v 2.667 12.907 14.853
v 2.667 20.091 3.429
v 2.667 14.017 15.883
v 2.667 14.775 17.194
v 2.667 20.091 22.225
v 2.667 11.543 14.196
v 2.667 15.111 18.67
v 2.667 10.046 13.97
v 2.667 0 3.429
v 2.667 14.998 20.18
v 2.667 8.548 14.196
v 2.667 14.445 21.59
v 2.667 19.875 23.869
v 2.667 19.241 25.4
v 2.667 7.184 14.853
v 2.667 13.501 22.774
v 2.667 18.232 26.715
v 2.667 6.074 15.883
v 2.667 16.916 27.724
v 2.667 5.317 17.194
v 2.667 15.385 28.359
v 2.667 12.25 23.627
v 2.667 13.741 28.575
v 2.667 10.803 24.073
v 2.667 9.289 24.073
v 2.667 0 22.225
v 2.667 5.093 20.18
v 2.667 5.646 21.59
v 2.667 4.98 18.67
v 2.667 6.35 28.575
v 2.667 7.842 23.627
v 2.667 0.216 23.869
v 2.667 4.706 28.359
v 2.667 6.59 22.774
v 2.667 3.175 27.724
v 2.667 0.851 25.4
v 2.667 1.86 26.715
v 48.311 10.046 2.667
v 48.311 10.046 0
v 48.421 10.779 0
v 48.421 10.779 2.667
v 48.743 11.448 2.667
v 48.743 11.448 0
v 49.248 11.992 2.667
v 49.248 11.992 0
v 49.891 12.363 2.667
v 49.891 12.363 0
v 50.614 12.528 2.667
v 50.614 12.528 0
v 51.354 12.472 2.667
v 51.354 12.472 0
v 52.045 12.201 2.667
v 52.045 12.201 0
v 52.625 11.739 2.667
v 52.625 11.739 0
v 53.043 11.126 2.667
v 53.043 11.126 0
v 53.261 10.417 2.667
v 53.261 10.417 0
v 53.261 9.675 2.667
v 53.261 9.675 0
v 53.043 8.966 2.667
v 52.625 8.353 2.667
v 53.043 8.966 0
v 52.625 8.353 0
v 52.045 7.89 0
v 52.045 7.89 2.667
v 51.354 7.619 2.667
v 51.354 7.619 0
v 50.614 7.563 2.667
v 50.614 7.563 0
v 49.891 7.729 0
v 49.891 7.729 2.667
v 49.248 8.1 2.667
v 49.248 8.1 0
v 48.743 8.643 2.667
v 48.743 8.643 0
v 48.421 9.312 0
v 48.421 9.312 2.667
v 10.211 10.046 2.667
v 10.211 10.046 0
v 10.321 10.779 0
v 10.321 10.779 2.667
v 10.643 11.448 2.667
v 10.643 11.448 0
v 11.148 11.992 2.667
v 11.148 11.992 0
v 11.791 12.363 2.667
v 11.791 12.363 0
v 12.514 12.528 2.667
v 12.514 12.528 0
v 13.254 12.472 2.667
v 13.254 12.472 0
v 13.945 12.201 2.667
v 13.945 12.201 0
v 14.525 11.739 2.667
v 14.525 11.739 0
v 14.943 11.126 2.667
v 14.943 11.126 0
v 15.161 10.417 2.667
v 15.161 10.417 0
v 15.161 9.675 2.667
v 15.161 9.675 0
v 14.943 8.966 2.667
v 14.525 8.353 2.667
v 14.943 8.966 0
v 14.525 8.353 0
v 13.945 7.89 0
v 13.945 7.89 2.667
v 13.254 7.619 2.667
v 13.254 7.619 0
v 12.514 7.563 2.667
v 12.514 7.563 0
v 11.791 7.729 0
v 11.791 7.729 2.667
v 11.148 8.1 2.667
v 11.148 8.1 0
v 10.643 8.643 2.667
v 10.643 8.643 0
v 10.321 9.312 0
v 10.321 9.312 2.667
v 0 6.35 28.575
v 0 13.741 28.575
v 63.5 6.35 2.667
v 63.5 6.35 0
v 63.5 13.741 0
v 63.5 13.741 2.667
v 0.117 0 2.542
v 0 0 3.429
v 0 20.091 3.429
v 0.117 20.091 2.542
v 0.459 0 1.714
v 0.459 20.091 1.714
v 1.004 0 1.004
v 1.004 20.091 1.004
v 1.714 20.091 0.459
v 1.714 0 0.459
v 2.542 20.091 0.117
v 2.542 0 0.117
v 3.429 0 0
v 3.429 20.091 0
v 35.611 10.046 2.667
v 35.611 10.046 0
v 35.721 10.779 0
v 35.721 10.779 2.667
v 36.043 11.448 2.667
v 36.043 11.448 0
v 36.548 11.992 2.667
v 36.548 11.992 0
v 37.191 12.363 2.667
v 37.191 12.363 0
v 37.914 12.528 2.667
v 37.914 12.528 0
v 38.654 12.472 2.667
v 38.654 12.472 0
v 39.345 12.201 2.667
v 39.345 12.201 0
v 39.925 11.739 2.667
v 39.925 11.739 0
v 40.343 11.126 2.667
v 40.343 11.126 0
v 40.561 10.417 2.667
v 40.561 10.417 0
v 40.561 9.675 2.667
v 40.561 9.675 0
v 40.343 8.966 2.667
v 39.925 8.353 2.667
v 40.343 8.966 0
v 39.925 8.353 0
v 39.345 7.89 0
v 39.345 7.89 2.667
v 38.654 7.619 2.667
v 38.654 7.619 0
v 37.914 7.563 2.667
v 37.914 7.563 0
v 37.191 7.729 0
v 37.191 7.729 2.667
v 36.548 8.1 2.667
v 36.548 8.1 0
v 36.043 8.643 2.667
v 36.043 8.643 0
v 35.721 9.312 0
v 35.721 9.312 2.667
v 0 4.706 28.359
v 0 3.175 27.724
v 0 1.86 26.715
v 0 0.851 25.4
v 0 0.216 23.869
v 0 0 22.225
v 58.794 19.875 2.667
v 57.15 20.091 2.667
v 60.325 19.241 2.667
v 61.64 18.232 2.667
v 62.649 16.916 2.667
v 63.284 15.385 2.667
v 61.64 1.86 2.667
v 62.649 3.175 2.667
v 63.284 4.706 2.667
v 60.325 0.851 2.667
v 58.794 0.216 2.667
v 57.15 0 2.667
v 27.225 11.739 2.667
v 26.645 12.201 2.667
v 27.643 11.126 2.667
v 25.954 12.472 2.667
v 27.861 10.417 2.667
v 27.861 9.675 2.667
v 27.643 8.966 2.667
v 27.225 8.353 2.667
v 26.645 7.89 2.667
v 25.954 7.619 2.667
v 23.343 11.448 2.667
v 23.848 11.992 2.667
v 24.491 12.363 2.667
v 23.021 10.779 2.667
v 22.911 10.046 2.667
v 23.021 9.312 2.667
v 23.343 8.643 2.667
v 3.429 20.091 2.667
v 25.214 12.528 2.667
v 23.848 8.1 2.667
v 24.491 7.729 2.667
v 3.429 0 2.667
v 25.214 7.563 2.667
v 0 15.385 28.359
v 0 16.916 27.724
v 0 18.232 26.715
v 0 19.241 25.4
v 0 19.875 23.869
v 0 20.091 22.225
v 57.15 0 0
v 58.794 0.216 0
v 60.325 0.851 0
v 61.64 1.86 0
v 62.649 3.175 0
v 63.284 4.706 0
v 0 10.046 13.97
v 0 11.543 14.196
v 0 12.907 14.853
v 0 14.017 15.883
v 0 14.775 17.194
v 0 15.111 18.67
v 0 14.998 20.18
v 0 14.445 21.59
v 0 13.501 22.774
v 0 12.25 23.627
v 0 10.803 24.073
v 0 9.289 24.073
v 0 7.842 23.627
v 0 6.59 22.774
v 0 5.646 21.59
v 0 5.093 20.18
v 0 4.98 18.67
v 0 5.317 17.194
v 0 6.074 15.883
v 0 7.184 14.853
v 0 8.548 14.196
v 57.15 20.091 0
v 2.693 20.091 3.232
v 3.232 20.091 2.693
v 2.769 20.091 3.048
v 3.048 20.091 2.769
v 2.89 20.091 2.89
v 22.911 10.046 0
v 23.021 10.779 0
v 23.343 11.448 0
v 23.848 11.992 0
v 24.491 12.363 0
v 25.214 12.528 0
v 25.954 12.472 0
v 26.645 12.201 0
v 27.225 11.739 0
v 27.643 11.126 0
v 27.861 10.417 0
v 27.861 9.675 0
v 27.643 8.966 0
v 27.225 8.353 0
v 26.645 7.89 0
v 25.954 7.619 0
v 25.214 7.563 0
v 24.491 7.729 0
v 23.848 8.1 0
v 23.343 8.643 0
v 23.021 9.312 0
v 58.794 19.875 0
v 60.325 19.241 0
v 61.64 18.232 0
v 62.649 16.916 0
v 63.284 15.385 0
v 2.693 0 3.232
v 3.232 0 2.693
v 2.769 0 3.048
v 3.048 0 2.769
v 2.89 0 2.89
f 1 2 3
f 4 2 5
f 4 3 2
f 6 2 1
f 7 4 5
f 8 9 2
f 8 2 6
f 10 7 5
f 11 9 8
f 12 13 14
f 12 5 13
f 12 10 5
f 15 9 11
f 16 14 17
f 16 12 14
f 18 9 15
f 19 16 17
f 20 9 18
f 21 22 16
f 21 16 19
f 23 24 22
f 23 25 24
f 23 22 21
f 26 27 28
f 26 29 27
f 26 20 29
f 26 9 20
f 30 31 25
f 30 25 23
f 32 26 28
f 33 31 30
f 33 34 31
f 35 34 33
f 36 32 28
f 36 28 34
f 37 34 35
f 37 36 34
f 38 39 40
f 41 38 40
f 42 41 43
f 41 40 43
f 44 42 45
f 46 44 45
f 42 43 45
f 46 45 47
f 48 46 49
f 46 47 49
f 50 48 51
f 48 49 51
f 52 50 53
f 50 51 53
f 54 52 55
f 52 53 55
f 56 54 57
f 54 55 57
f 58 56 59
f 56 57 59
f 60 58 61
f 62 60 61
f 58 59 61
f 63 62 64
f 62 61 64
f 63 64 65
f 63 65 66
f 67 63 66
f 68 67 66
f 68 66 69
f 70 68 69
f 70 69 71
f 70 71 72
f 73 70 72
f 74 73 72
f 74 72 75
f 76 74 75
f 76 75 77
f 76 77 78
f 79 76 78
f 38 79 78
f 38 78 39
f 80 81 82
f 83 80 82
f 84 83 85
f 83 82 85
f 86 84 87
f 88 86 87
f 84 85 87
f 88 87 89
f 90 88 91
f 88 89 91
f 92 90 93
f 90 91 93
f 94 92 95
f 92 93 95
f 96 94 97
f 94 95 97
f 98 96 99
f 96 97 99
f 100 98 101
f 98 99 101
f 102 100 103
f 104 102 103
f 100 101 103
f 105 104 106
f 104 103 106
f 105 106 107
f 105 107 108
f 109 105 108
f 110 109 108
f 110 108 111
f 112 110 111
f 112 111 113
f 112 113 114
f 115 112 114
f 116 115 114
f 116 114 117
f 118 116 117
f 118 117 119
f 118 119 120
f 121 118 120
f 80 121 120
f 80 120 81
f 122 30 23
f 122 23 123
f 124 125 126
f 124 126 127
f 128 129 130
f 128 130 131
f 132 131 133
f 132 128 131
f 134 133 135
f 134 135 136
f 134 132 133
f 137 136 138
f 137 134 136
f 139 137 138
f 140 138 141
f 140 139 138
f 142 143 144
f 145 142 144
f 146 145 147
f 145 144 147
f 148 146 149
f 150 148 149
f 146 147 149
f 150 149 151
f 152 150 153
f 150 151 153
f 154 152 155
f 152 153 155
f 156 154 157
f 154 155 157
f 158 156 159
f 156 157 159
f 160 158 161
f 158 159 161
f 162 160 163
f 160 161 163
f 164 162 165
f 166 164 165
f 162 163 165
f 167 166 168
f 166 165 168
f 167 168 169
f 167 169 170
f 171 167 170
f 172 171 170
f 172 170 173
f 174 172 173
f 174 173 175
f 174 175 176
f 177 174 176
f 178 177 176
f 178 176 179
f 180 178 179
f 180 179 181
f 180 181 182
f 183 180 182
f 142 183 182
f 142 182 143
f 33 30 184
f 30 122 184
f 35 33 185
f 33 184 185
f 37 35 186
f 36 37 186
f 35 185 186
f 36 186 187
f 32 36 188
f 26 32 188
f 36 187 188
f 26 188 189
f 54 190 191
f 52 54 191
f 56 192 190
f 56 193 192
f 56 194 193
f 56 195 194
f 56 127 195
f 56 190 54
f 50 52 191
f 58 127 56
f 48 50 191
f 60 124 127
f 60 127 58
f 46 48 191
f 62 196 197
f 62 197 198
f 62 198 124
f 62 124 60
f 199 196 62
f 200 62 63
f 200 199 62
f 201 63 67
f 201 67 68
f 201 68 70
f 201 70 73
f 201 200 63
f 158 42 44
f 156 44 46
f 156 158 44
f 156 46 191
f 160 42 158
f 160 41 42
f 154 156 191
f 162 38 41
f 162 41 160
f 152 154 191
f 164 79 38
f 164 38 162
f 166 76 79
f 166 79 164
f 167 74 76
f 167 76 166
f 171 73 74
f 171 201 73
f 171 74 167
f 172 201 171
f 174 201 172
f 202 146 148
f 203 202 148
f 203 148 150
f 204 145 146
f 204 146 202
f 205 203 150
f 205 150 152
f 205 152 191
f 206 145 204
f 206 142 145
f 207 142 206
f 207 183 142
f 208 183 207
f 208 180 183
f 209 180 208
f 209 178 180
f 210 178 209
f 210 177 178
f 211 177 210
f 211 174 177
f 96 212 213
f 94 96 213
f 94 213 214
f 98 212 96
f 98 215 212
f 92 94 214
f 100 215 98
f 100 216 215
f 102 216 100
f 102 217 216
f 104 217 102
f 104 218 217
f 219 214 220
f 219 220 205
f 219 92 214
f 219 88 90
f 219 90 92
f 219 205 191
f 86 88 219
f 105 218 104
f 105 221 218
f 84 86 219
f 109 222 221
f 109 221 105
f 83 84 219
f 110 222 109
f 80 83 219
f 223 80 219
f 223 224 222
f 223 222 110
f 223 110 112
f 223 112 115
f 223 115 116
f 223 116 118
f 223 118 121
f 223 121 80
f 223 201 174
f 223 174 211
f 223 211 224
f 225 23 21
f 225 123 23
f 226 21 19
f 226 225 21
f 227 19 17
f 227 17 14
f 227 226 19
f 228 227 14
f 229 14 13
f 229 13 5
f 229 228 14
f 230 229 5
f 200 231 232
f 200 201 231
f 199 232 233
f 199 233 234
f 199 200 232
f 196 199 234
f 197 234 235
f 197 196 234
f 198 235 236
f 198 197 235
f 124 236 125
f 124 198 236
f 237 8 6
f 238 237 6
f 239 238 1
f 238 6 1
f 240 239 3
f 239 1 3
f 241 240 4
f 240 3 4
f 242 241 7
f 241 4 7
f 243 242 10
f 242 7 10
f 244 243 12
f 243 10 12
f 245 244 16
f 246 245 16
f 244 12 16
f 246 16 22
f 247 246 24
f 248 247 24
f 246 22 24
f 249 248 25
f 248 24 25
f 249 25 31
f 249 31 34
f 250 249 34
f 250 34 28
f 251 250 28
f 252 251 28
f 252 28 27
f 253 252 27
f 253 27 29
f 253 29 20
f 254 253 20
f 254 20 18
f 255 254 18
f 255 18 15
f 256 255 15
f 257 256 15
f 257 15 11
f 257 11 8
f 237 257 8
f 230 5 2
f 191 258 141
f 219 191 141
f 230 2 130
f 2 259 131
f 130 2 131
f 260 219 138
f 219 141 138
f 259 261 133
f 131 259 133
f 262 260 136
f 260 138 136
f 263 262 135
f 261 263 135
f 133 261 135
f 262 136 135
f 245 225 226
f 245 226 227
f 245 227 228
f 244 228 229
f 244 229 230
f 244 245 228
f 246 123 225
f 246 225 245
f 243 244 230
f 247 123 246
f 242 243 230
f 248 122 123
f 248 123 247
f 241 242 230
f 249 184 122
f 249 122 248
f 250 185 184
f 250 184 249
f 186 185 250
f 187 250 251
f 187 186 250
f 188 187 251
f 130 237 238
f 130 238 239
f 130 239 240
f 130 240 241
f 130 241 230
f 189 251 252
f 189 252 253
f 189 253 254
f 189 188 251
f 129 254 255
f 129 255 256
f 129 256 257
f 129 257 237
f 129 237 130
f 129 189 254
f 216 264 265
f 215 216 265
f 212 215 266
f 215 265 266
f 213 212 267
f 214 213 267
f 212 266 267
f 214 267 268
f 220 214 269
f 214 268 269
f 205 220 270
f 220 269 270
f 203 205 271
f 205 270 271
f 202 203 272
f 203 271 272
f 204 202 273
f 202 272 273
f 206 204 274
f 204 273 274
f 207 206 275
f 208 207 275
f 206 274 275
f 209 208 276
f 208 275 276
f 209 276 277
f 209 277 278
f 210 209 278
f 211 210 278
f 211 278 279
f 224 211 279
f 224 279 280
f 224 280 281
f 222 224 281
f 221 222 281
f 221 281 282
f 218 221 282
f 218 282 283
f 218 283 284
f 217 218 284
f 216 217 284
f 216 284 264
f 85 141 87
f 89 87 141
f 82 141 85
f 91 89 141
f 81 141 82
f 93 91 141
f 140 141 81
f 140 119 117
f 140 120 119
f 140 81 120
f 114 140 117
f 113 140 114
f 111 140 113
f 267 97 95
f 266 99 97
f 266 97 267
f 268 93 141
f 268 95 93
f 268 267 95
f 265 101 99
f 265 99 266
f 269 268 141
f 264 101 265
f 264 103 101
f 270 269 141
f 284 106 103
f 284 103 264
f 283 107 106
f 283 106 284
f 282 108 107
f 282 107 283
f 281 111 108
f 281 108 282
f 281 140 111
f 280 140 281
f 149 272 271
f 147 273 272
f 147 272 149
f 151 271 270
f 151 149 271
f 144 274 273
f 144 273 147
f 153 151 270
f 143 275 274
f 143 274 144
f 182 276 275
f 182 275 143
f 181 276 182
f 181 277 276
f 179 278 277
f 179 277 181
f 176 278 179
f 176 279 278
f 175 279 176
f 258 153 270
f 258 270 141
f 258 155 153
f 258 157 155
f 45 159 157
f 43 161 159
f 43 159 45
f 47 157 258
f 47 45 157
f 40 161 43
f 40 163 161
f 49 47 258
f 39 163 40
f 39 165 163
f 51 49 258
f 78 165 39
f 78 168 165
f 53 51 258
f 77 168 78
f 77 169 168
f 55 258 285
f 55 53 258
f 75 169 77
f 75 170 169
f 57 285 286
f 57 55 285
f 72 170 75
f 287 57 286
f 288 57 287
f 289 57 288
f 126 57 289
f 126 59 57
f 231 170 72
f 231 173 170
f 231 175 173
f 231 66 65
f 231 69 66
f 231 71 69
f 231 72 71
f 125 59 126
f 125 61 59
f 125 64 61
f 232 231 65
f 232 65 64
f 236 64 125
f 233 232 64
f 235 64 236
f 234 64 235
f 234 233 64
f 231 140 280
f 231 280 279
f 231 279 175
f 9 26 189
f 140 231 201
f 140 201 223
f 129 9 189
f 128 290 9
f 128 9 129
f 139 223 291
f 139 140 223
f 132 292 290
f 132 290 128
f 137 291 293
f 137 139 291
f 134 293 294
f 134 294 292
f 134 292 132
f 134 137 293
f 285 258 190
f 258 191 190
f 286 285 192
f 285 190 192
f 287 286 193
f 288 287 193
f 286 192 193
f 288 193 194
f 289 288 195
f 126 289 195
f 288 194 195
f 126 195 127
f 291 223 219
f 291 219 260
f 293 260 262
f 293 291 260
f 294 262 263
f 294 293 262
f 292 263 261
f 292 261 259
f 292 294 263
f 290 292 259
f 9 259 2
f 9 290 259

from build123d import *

# Parameters (mm, degrees)
BASE_FLANGE1_DEPTH = 20.0914
SKETCH6_R          = 5.08
CUT_EXTRUDE1_DEPTH = 71.148762412
FILLET1_R          = 6.35
SKETCH7_R          = 2.4892
CUT_EXTRUDE2_DEPTH = 73.473753725


# Sheet-metal steps are written as plain solids
with BuildPart() as part:
    # Sketch1 → Base-Flange1 (new body)
    with BuildSketch(Plane(origin=(0, 0, 0), x_dir=(1, 0, 0), z_dir=(0, 1, 0))):
        with BuildLine():
            Line((0, -28.575), (0, -3.429))
            ThreePointArc((0, -3.429), (1.004330847, -1.004330847), (3.429, 0))
            Line((3.429, 0), (63.5, 0))
            Line((63.5, 0), (63.5, -2.667))
            Line((63.5, -2.667), (3.429, -2.667))
            ThreePointArc((3.429, -2.667), (2.890184633, -2.890184633), (2.667, -3.429))
            Line((2.667, -3.429), (2.667, -28.575))
            Line((2.667, -28.575), (0, -28.575))
        make_face()
    extrude(amount=BASE_FLANGE1_DEPTH)

    # Sketch6 → Cut-Extrude1 (cut, through all)
    with BuildSketch(Plane(origin=(2.667, 0, 0), x_dir=(0, 0, -1), z_dir=(1, 0, 0))):
        with Locations((-19.05, 10.0457)):
            Circle(SKETCH6_R)
    extrude(amount=-CUT_EXTRUDE1_DEPTH, mode=Mode.SUBTRACT)

    # Fillet1
    fillet1_edges = [part.edges().sort_by_distance(p)[0] for p in [
        (1.3335, 20.0914, 28.575),
        (1.3335, 0, 28.575),
        (63.5, 20.0914, 1.3335),
        (63.5, 0, 1.3335),
    ]]
    fillet(fillet1_edges, radius=FILLET1_R)

    # Sketch7 → Cut-Extrude2 (cut, through all)
    with BuildSketch(Plane(origin=(0, 0, 0), x_dir=(-1, 0, 0), z_dir=(0, 0, -1))):
        with Locations((-50.8, 10.0457)):
            Circle(SKETCH7_R)
        with Locations((-38.1, 10.0457)):
            Circle(SKETCH7_R)
        with Locations((-25.4, 10.0457)):
            Circle(SKETCH7_R)
        with Locations((-12.7, 10.0457)):
            Circle(SKETCH7_R)
    extrude(amount=-CUT_EXTRUDE2_DEPTH, mode=Mode.SUBTRACT)


solid = part.part
